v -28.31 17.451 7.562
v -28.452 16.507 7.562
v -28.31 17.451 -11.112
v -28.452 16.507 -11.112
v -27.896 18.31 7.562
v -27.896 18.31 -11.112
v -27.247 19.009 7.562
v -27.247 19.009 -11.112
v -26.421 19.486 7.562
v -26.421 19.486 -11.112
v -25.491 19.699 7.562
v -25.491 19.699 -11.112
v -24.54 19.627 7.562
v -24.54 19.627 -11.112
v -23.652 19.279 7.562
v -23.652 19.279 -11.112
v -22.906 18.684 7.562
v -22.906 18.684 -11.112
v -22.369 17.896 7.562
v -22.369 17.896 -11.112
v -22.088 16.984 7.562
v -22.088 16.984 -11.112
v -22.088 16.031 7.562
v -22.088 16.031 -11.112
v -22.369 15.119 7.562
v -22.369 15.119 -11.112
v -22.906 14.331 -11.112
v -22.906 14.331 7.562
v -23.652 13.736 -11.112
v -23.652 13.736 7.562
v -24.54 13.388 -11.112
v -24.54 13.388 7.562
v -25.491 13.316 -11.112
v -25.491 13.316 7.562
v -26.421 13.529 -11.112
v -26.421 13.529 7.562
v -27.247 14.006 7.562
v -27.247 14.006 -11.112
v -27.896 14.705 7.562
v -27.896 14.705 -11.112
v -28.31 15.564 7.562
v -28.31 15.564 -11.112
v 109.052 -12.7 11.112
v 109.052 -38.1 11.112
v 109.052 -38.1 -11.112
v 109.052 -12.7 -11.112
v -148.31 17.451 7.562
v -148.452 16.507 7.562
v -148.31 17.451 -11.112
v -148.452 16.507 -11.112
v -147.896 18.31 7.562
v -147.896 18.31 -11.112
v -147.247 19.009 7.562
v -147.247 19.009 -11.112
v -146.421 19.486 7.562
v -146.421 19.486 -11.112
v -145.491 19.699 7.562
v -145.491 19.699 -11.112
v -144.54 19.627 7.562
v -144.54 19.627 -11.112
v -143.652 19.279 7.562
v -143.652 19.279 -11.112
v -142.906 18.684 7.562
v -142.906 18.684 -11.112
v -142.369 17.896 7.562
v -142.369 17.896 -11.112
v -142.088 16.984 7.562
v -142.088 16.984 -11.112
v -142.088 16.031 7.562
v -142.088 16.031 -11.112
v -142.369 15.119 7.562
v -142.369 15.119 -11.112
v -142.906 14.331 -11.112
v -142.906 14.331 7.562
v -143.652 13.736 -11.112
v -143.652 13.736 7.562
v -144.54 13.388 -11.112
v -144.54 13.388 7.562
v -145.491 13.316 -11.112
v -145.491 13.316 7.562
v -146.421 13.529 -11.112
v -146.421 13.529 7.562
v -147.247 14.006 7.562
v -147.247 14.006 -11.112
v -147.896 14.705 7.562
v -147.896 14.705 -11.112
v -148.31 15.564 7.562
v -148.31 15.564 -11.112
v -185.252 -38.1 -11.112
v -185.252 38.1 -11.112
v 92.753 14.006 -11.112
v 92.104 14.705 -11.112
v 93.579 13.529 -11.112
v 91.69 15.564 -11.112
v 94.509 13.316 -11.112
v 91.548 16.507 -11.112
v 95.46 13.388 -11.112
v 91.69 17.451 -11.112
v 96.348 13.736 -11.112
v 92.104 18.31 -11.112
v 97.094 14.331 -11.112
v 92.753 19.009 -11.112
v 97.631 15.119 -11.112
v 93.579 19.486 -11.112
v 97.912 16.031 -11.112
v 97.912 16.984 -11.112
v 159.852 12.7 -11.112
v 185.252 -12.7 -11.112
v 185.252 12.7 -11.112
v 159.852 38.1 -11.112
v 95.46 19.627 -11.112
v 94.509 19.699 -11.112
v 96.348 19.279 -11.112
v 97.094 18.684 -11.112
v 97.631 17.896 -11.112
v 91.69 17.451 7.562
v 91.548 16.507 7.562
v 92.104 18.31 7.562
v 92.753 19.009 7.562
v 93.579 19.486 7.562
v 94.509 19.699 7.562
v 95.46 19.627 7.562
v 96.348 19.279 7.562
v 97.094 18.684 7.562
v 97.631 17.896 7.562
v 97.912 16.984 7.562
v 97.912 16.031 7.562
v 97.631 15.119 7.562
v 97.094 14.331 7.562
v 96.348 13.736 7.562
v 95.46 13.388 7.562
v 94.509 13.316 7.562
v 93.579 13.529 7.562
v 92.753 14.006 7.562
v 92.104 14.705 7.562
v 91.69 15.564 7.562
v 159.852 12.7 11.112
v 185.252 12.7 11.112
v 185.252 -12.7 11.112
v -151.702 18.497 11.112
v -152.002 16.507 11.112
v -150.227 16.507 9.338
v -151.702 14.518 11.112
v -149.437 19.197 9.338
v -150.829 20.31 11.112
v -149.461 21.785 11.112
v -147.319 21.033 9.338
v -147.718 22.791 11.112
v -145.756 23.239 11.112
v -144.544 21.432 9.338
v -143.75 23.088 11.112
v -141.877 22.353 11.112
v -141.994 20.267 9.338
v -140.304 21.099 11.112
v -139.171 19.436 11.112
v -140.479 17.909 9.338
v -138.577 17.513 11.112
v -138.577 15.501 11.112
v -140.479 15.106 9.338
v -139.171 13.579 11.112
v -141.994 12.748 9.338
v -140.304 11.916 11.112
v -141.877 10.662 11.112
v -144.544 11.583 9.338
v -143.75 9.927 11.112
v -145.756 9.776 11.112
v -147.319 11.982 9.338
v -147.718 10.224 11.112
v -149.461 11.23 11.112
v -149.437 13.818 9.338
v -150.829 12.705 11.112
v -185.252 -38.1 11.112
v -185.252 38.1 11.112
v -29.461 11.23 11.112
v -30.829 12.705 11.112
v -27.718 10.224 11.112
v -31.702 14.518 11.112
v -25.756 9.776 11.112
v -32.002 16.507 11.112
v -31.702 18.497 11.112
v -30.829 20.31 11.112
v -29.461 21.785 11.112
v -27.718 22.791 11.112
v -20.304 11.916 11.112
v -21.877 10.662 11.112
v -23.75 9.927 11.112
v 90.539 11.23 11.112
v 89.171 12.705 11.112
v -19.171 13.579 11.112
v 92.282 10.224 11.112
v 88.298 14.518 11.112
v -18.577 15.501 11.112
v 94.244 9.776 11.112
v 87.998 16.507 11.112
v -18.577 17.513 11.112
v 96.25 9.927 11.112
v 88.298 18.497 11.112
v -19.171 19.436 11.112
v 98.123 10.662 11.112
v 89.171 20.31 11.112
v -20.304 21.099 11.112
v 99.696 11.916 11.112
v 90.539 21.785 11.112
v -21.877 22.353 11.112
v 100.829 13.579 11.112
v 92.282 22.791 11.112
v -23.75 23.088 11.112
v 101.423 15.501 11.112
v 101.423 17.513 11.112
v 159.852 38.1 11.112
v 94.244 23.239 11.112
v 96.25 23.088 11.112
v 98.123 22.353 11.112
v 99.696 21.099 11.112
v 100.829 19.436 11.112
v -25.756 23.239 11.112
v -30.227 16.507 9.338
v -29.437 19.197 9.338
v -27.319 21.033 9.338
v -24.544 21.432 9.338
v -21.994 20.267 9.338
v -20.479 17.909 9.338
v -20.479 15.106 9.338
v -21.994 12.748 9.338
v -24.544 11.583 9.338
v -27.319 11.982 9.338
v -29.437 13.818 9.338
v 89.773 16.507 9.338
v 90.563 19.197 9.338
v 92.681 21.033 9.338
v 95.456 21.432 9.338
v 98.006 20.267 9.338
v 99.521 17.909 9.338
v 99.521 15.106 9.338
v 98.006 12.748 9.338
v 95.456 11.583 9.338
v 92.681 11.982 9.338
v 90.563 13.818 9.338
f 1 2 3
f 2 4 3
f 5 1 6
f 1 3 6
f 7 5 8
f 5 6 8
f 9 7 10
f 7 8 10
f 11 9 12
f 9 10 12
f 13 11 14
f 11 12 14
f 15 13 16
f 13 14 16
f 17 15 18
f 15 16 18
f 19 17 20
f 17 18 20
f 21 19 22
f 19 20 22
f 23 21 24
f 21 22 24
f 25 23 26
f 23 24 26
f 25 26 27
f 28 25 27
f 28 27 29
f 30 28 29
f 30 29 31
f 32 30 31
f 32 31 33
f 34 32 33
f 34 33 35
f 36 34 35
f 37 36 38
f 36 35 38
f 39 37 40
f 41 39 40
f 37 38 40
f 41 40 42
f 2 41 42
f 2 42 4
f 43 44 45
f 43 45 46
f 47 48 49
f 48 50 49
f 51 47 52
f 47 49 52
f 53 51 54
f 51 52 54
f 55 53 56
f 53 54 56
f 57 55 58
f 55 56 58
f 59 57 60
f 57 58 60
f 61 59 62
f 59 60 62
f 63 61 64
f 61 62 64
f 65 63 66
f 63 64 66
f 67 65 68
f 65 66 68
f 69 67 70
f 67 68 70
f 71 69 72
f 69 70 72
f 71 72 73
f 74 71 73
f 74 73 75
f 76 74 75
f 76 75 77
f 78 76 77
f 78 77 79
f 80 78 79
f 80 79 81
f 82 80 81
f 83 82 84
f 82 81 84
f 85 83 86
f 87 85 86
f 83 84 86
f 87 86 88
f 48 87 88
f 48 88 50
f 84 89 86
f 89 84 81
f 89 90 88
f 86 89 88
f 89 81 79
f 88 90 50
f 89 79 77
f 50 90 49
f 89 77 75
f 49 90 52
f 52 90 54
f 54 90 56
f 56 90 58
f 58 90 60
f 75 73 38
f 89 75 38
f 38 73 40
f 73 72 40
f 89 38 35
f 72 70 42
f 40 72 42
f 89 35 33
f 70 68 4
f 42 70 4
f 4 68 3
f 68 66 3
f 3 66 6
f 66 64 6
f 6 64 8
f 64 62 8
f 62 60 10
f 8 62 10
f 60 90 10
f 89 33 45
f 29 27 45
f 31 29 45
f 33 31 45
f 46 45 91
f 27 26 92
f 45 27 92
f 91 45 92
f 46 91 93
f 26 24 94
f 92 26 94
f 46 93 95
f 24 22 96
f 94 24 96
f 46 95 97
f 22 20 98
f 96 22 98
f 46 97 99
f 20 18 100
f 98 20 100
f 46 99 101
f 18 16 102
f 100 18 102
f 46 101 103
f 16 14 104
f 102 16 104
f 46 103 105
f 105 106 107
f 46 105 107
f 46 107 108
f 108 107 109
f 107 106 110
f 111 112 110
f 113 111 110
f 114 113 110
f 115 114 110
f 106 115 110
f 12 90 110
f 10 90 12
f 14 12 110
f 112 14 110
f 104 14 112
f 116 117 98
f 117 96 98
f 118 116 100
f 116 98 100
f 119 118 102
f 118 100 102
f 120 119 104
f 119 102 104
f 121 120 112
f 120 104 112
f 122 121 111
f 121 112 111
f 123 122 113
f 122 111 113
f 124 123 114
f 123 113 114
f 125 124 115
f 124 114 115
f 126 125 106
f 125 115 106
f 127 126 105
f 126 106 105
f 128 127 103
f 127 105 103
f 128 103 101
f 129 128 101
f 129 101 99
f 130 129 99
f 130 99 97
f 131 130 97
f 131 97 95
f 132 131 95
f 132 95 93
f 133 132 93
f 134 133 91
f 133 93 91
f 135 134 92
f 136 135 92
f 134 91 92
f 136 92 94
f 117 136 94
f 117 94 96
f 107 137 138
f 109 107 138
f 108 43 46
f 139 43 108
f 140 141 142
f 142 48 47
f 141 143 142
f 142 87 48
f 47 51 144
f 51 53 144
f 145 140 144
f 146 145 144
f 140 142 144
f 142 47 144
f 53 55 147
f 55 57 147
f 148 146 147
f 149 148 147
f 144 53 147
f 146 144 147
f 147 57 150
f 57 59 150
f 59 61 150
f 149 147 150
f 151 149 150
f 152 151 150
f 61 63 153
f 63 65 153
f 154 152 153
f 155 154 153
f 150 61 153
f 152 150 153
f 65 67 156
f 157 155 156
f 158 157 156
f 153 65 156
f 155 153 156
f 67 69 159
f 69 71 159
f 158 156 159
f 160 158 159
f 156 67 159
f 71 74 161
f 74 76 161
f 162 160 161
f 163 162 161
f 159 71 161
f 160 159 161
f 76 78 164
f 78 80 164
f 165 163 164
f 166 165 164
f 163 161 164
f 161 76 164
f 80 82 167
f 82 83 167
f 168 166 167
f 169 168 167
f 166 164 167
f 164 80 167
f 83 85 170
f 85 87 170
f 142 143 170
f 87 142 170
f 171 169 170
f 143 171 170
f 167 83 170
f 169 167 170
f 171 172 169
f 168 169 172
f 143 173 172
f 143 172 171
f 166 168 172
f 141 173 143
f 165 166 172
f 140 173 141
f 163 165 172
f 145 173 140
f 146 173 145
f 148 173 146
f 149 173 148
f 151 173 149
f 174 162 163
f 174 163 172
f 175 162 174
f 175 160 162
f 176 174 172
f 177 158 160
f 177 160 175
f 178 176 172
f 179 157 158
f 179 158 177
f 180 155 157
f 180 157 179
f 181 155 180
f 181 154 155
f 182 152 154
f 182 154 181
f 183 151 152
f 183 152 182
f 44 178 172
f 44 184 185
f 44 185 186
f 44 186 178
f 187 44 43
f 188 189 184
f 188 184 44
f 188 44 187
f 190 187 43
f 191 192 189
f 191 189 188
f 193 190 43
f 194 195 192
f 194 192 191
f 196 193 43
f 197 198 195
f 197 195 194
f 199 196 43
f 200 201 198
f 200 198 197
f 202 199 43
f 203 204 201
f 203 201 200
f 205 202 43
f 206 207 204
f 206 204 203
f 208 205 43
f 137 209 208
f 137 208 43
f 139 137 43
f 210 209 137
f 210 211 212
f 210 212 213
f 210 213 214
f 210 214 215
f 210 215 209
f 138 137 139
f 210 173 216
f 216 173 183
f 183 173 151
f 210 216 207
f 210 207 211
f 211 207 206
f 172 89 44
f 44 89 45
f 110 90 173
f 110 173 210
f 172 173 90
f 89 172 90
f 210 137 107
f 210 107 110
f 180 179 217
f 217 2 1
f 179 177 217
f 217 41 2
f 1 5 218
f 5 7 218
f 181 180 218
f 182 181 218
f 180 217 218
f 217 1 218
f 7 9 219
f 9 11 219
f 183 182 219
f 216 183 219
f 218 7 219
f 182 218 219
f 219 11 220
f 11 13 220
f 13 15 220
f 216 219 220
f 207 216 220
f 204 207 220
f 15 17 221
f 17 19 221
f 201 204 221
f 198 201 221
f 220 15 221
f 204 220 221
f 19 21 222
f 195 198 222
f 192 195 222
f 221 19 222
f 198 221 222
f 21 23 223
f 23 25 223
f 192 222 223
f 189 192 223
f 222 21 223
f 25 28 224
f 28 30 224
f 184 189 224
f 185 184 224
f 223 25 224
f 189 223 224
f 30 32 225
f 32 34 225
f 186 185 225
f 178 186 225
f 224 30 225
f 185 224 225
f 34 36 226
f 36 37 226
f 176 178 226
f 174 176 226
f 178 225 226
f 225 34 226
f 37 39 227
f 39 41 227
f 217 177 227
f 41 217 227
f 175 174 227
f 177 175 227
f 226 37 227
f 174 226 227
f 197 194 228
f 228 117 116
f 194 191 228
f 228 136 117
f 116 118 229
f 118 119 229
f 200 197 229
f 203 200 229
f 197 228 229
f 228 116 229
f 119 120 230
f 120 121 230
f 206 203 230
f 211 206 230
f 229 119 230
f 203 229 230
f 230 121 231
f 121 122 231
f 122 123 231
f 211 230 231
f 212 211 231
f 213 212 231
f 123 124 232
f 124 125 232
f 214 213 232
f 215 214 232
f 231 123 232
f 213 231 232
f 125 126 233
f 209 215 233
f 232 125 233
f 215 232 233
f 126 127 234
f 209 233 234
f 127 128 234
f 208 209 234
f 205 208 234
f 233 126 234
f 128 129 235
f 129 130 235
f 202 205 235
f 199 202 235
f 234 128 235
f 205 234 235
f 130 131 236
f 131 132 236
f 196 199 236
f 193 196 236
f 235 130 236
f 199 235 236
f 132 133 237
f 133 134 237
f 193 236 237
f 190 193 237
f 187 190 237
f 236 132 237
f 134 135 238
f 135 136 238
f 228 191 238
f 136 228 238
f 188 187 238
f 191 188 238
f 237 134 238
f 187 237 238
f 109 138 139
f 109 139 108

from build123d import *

# Parameters (mm, degrees)
SKETCH1_W                                            = 370.50412818
SKETCH1_H                                            = 22.225
BOSS_EXTRUDE1_DEPTH                                  = 38.1
CSK_FOR_M6_HEX_SOCKET_COUNTERSUNK_HEAD_S_D           = 6.4
CSK_FOR_M6_HEX_SOCKET_COUNTERSUNK_HEAD_S_CSINK_D     = 13.5
CSK_FOR_M6_HEX_SOCKET_COUNTERSUNK_HEAD_S_CSINK_ANGLE = 90
SKETCH3_W                                            = 25.4
SKETCH3_H                                            = 25.4
SKETCH3_W_2                                          = 76.2
CUT_EXTRUDE1_DEPTH                                   = 23.225


with BuildPart() as part:
    # Sketch1 → Boss-Extrude1 (new body, symmetric)
    with BuildSketch(Plane(origin=(0, 0, 0), x_dir=(1, 0, 0), z_dir=(0, 1, 0))):
        Rectangle(SKETCH1_W, SKETCH1_H)
    extrude(amount=BOSS_EXTRUDE1_DEPTH, both=True)

    # CSK for M6 Hex Socket Countersunk Head Screw6 (through all)
    with Locations(Plane.XY.offset(11.1125)):
        with Locations((-145.252063961, 16.50746), (-25.252063961, 16.50746), (94.747936039, 16.50746)):
            CounterSinkHole(CSK_FOR_M6_HEX_SOCKET_COUNTERSUNK_HEAD_S_D / 2, CSK_FOR_M6_HEX_SOCKET_COUNTERSUNK_HEAD_S_CSINK_D / 2, counter_sink_angle=CSK_FOR_M6_HEX_SOCKET_COUNTERSUNK_HEAD_S_CSINK_ANGLE)

    # Sketch3 → Cut-Extrude1 (cut, through all)
    with BuildSketch(Plane.XY.offset(11.1125)):
        with Locations((172.55206409, 25.4)):
            Rectangle(SKETCH3_W, SKETCH3_H)
        with Locations((147.15206409, -25.4)):
            Rectangle(SKETCH3_W_2, SKETCH3_H)
    extrude(amount=-CUT_EXTRUDE1_DEPTH, mode=Mode.SUBTRACT)


solid = part.part
